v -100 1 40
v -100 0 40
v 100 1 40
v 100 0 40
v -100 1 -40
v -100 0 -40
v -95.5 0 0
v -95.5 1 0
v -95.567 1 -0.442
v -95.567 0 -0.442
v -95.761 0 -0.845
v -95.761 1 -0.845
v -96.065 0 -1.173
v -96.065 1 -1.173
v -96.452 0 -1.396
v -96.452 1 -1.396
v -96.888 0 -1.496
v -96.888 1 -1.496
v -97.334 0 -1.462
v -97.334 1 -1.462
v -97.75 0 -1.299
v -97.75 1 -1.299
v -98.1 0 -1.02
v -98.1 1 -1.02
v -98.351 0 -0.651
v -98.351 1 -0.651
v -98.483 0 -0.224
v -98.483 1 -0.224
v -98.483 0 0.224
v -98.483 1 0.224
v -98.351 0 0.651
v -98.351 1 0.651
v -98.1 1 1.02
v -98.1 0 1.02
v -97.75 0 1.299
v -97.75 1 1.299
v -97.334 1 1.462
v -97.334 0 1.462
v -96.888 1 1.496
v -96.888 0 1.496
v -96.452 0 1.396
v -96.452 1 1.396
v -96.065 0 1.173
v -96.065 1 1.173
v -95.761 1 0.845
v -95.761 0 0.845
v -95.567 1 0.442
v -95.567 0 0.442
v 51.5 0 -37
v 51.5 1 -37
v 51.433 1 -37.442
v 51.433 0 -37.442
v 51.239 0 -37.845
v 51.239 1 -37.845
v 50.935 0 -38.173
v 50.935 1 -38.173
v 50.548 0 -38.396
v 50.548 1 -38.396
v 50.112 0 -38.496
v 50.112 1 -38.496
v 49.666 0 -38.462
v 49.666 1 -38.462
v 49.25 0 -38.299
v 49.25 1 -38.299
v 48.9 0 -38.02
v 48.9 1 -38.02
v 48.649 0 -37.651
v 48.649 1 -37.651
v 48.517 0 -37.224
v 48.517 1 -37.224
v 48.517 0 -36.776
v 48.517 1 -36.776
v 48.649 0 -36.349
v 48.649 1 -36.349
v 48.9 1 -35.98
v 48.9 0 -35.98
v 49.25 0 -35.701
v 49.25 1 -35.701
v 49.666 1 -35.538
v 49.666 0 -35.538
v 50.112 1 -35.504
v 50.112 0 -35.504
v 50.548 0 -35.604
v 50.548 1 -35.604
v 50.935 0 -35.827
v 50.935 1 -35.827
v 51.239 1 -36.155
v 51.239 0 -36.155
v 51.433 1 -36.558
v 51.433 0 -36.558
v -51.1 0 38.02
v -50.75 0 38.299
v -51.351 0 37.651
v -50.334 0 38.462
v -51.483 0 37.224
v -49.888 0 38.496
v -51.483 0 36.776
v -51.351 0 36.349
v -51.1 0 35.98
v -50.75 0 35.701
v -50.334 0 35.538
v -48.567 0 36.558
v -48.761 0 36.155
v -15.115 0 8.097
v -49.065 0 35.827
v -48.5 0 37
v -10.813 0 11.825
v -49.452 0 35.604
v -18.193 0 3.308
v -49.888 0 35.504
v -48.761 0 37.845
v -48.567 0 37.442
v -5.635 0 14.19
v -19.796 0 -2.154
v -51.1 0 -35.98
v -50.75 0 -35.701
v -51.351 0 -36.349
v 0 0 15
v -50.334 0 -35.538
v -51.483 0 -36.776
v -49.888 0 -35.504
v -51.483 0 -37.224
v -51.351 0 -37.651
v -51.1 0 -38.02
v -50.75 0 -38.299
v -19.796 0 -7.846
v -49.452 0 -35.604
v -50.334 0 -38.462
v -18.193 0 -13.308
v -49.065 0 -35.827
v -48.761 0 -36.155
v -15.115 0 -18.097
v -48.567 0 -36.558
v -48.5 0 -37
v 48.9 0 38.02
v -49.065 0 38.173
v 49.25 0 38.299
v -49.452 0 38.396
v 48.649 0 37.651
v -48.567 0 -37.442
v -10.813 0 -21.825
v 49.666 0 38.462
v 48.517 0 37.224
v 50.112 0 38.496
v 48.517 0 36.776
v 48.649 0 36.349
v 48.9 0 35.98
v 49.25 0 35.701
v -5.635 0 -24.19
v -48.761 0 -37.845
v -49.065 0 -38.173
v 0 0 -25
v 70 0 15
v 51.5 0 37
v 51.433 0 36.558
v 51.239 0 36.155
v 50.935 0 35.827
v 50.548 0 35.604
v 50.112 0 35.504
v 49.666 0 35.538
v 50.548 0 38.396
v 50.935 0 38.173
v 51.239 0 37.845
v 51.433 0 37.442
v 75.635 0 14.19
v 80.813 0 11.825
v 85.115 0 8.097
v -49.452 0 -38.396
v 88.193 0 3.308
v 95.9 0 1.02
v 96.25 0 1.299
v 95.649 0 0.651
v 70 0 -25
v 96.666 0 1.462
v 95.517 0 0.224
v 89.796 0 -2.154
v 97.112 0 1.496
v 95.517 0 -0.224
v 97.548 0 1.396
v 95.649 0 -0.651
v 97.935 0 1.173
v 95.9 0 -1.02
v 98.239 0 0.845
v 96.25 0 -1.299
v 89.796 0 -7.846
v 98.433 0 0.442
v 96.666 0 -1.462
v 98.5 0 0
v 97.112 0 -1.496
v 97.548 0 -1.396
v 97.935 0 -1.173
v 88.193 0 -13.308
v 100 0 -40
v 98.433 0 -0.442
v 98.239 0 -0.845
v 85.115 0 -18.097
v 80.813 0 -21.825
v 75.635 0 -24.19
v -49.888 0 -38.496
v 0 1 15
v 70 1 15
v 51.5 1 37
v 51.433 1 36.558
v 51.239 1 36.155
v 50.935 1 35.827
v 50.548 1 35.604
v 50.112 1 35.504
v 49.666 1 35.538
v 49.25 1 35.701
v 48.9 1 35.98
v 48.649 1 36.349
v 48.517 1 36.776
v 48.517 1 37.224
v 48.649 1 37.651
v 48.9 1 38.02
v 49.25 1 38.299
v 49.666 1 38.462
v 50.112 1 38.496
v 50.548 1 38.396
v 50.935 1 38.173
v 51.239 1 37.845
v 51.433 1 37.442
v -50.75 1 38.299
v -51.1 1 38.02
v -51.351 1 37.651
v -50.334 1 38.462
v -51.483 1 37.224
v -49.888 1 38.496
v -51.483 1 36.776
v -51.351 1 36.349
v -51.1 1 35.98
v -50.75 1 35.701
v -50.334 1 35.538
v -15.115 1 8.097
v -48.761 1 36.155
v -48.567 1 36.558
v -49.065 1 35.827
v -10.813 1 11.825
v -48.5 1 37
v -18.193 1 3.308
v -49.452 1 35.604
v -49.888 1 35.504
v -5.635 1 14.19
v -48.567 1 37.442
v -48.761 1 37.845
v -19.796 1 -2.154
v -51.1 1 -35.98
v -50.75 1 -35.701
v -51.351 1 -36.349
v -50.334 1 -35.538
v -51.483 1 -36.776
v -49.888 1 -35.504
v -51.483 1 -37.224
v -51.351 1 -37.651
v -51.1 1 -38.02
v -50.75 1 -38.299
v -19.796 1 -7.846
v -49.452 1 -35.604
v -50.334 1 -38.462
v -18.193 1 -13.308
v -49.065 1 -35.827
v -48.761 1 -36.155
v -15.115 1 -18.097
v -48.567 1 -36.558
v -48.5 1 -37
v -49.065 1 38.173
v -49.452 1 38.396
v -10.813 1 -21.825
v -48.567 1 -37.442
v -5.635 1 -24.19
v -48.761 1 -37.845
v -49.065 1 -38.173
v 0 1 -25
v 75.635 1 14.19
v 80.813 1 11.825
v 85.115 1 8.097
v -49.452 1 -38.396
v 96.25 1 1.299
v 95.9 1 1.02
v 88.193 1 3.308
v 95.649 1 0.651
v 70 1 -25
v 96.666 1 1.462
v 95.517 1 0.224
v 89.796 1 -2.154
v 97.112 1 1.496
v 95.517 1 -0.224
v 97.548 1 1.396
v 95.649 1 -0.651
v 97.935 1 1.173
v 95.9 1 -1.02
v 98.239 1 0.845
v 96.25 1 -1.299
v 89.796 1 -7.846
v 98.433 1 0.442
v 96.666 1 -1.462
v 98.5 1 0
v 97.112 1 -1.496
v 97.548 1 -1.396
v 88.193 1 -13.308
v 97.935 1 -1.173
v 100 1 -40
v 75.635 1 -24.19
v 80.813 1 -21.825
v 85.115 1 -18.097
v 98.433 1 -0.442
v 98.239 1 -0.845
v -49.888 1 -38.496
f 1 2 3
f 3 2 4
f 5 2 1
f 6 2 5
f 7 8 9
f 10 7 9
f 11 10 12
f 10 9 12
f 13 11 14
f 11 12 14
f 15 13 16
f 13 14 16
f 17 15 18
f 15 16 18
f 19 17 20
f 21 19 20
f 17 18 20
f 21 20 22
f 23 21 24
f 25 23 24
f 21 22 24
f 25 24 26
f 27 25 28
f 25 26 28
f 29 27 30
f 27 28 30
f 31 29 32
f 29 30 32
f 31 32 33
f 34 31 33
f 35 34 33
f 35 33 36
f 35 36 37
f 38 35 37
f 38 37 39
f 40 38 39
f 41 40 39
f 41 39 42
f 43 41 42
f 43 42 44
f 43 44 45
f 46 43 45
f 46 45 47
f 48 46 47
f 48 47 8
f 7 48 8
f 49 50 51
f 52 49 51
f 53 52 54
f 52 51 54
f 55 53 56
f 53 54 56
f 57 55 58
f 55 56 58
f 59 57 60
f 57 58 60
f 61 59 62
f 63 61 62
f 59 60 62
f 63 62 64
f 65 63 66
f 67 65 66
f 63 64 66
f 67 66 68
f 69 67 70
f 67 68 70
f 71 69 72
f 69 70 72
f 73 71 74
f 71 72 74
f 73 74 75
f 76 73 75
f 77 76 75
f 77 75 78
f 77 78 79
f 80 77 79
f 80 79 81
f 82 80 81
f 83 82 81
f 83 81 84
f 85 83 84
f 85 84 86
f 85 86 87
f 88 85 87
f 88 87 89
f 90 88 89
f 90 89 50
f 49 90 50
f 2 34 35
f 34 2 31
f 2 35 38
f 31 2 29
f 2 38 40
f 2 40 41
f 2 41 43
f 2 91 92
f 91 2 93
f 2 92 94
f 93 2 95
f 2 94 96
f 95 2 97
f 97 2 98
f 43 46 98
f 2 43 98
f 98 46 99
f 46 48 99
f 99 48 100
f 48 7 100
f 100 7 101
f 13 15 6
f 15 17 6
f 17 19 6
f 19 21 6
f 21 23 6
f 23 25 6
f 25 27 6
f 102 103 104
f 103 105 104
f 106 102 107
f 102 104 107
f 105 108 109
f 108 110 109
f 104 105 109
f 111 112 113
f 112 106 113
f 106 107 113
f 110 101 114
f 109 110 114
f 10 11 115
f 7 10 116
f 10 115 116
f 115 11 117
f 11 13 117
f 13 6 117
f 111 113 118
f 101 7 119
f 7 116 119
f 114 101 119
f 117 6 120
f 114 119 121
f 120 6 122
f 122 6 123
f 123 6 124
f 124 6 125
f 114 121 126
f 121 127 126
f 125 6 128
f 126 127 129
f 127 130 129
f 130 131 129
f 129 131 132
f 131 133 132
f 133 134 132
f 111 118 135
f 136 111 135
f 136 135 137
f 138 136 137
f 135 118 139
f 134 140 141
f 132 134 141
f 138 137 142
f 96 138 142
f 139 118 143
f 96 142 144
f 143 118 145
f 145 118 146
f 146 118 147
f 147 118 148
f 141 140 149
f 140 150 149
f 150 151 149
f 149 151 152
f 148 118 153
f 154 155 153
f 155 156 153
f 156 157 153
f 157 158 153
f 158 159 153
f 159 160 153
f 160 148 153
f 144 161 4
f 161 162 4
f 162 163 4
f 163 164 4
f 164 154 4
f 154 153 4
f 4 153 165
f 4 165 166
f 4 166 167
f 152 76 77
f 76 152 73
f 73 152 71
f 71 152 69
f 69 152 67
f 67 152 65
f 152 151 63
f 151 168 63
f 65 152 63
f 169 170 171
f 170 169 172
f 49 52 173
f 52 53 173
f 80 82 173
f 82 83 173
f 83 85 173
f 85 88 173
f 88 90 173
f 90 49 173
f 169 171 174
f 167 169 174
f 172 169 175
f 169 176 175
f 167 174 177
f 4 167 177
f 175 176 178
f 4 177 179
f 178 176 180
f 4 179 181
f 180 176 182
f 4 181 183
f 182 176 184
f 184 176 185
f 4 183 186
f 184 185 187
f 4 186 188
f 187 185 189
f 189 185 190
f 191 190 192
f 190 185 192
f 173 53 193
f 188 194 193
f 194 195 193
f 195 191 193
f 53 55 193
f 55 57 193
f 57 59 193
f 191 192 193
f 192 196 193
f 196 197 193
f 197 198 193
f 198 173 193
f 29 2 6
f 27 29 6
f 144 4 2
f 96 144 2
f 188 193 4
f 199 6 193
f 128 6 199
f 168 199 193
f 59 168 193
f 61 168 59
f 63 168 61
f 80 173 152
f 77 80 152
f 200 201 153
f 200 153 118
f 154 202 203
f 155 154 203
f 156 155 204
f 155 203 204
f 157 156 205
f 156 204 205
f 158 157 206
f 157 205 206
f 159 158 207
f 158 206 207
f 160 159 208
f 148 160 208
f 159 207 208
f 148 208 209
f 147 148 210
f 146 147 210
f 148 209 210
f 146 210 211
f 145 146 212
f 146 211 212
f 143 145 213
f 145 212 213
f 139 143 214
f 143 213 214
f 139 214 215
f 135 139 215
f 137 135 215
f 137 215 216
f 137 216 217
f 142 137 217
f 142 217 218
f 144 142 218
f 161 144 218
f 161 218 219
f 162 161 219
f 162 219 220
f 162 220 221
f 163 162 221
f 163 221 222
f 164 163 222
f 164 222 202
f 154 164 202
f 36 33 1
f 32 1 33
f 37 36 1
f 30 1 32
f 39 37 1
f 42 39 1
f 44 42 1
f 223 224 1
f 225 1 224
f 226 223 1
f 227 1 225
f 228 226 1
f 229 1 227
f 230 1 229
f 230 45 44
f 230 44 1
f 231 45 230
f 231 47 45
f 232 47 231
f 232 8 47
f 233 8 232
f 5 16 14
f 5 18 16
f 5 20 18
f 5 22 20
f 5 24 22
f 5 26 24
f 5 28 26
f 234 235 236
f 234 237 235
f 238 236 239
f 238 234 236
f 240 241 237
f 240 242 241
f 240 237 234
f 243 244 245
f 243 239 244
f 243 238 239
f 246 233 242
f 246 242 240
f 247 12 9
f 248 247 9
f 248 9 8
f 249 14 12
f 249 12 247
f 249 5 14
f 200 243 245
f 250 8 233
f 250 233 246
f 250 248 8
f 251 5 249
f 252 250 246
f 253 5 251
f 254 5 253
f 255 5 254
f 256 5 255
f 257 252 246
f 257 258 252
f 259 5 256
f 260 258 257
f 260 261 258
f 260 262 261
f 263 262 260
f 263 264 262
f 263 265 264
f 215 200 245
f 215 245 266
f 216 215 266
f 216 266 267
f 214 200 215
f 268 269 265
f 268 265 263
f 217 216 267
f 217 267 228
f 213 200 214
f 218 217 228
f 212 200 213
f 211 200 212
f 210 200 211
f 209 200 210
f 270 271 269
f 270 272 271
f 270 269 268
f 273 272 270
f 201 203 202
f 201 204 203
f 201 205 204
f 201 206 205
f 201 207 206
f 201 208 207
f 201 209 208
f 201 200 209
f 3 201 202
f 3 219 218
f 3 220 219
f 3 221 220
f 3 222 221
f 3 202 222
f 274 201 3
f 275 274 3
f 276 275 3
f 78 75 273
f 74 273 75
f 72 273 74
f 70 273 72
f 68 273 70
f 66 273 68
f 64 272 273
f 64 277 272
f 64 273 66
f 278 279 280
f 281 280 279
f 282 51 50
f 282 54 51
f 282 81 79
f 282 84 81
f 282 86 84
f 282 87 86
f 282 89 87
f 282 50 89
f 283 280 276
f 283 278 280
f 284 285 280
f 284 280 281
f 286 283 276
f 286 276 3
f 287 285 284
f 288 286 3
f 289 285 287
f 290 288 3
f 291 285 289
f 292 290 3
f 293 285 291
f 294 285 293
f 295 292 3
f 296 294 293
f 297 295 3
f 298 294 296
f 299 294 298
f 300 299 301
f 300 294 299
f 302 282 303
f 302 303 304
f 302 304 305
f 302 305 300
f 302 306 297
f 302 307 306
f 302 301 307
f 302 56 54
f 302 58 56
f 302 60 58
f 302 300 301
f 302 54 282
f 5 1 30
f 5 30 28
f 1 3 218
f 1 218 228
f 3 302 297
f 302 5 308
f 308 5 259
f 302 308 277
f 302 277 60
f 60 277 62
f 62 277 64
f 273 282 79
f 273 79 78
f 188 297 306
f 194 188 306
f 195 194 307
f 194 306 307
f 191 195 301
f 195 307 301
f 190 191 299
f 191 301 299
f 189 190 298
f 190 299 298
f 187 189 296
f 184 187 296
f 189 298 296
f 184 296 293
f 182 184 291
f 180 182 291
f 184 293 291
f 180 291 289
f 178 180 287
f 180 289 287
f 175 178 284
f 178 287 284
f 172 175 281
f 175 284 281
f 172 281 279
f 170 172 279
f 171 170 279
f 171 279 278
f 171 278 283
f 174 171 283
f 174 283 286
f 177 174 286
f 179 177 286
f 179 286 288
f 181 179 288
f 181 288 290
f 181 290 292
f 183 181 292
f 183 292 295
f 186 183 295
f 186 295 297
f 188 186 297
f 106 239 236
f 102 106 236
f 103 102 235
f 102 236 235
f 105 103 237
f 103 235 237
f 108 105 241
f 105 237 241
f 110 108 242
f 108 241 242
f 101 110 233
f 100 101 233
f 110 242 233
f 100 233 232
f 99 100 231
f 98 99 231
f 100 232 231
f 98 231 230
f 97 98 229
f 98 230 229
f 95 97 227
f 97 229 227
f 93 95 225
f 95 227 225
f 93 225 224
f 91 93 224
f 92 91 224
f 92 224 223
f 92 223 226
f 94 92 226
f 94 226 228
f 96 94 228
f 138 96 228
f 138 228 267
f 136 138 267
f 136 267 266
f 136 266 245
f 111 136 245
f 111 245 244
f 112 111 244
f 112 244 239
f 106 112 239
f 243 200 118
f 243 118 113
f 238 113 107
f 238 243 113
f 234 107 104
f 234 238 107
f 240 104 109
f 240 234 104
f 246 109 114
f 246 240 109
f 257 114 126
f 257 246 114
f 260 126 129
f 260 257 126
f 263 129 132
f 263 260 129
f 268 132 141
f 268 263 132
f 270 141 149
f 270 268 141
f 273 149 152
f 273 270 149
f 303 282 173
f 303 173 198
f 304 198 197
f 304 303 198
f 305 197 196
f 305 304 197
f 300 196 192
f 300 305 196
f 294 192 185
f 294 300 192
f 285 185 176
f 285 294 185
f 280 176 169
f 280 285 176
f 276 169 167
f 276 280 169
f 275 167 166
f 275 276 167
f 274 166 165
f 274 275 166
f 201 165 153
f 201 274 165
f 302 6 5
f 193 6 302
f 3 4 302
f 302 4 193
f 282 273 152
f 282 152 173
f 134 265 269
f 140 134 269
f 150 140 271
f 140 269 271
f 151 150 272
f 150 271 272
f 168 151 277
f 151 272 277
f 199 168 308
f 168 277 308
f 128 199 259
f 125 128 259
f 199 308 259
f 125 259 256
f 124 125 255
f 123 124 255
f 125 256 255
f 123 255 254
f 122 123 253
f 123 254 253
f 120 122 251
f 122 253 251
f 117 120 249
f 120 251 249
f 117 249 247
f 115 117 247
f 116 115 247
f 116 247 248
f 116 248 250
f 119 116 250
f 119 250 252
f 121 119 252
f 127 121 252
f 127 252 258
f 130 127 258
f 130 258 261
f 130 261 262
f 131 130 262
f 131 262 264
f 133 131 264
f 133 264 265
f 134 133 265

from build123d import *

# Parameters (mm, degrees)
SKETCH_1_W          = 200
SKETCH_1_H          = 80
EXTRUDE_1_DEPTH     = 1
CUT_EXTRUDE_1_REACH = 3
SKETCH_3_R          = 1.5
CUT_EXTRUDE_2_DEPTH = 10


with BuildPart() as part:
    # 草图1 → 凸台-拉伸1 (new body)
    with BuildSketch(Plane(origin=(0, 0, 0), x_dir=(1, 0, 0), z_dir=(0, 1, 0))):
        Rectangle(SKETCH_1_W, SKETCH_1_H)
    extrude(amount=EXTRUDE_1_DEPTH)

    # 草图2 → 切除-拉伸1 (cut, up to next)
    with BuildSketch(Plane(origin=(0, 1, 0), x_dir=(1, 0, 0), z_dir=(0, 1, 0)), mode=Mode.PRIVATE) as cut_extrude_1_sk1:
        with BuildLine():
            Line((0, 25), (70, 25))
            ThreePointArc((70, 25), (90, 5), (70, -15))
            Line((70, -15), (0, -15))
            ThreePointArc((0, -15), (-20, 5), (0, 25))
        make_face()
    cut_extrude_1_tool1 = extrude(cut_extrude_1_sk1.sketch, amount=-CUT_EXTRUDE_1_REACH, mode=Mode.PRIVATE) & part.part
    add(cut_extrude_1_tool1.solids().sort_by_distance((35, 1, -5))[0], mode=Mode.SUBTRACT)

    # 草图3 → 切除-拉伸2 (cut)
    with BuildSketch(Plane(origin=(0, 1, 0), x_dir=(1, 0, 0), z_dir=(0, 1, 0))):
        with Locations((-50, 37)):
            Circle(SKETCH_3_R)
        with Locations((50, 37)):
            Circle(SKETCH_3_R)
        with Locations((50, -37)):
            Circle(SKETCH_3_R)
        with Locations((-50, -37)):
            Circle(SKETCH_3_R)
        with Locations((-97, 0)):
            Circle(SKETCH_3_R)
        with Locations((97, 0)):
            Circle(SKETCH_3_R)
    extrude(amount=-CUT_EXTRUDE_2_DEPTH, mode=Mode.SUBTRACT)


solid = part.part
